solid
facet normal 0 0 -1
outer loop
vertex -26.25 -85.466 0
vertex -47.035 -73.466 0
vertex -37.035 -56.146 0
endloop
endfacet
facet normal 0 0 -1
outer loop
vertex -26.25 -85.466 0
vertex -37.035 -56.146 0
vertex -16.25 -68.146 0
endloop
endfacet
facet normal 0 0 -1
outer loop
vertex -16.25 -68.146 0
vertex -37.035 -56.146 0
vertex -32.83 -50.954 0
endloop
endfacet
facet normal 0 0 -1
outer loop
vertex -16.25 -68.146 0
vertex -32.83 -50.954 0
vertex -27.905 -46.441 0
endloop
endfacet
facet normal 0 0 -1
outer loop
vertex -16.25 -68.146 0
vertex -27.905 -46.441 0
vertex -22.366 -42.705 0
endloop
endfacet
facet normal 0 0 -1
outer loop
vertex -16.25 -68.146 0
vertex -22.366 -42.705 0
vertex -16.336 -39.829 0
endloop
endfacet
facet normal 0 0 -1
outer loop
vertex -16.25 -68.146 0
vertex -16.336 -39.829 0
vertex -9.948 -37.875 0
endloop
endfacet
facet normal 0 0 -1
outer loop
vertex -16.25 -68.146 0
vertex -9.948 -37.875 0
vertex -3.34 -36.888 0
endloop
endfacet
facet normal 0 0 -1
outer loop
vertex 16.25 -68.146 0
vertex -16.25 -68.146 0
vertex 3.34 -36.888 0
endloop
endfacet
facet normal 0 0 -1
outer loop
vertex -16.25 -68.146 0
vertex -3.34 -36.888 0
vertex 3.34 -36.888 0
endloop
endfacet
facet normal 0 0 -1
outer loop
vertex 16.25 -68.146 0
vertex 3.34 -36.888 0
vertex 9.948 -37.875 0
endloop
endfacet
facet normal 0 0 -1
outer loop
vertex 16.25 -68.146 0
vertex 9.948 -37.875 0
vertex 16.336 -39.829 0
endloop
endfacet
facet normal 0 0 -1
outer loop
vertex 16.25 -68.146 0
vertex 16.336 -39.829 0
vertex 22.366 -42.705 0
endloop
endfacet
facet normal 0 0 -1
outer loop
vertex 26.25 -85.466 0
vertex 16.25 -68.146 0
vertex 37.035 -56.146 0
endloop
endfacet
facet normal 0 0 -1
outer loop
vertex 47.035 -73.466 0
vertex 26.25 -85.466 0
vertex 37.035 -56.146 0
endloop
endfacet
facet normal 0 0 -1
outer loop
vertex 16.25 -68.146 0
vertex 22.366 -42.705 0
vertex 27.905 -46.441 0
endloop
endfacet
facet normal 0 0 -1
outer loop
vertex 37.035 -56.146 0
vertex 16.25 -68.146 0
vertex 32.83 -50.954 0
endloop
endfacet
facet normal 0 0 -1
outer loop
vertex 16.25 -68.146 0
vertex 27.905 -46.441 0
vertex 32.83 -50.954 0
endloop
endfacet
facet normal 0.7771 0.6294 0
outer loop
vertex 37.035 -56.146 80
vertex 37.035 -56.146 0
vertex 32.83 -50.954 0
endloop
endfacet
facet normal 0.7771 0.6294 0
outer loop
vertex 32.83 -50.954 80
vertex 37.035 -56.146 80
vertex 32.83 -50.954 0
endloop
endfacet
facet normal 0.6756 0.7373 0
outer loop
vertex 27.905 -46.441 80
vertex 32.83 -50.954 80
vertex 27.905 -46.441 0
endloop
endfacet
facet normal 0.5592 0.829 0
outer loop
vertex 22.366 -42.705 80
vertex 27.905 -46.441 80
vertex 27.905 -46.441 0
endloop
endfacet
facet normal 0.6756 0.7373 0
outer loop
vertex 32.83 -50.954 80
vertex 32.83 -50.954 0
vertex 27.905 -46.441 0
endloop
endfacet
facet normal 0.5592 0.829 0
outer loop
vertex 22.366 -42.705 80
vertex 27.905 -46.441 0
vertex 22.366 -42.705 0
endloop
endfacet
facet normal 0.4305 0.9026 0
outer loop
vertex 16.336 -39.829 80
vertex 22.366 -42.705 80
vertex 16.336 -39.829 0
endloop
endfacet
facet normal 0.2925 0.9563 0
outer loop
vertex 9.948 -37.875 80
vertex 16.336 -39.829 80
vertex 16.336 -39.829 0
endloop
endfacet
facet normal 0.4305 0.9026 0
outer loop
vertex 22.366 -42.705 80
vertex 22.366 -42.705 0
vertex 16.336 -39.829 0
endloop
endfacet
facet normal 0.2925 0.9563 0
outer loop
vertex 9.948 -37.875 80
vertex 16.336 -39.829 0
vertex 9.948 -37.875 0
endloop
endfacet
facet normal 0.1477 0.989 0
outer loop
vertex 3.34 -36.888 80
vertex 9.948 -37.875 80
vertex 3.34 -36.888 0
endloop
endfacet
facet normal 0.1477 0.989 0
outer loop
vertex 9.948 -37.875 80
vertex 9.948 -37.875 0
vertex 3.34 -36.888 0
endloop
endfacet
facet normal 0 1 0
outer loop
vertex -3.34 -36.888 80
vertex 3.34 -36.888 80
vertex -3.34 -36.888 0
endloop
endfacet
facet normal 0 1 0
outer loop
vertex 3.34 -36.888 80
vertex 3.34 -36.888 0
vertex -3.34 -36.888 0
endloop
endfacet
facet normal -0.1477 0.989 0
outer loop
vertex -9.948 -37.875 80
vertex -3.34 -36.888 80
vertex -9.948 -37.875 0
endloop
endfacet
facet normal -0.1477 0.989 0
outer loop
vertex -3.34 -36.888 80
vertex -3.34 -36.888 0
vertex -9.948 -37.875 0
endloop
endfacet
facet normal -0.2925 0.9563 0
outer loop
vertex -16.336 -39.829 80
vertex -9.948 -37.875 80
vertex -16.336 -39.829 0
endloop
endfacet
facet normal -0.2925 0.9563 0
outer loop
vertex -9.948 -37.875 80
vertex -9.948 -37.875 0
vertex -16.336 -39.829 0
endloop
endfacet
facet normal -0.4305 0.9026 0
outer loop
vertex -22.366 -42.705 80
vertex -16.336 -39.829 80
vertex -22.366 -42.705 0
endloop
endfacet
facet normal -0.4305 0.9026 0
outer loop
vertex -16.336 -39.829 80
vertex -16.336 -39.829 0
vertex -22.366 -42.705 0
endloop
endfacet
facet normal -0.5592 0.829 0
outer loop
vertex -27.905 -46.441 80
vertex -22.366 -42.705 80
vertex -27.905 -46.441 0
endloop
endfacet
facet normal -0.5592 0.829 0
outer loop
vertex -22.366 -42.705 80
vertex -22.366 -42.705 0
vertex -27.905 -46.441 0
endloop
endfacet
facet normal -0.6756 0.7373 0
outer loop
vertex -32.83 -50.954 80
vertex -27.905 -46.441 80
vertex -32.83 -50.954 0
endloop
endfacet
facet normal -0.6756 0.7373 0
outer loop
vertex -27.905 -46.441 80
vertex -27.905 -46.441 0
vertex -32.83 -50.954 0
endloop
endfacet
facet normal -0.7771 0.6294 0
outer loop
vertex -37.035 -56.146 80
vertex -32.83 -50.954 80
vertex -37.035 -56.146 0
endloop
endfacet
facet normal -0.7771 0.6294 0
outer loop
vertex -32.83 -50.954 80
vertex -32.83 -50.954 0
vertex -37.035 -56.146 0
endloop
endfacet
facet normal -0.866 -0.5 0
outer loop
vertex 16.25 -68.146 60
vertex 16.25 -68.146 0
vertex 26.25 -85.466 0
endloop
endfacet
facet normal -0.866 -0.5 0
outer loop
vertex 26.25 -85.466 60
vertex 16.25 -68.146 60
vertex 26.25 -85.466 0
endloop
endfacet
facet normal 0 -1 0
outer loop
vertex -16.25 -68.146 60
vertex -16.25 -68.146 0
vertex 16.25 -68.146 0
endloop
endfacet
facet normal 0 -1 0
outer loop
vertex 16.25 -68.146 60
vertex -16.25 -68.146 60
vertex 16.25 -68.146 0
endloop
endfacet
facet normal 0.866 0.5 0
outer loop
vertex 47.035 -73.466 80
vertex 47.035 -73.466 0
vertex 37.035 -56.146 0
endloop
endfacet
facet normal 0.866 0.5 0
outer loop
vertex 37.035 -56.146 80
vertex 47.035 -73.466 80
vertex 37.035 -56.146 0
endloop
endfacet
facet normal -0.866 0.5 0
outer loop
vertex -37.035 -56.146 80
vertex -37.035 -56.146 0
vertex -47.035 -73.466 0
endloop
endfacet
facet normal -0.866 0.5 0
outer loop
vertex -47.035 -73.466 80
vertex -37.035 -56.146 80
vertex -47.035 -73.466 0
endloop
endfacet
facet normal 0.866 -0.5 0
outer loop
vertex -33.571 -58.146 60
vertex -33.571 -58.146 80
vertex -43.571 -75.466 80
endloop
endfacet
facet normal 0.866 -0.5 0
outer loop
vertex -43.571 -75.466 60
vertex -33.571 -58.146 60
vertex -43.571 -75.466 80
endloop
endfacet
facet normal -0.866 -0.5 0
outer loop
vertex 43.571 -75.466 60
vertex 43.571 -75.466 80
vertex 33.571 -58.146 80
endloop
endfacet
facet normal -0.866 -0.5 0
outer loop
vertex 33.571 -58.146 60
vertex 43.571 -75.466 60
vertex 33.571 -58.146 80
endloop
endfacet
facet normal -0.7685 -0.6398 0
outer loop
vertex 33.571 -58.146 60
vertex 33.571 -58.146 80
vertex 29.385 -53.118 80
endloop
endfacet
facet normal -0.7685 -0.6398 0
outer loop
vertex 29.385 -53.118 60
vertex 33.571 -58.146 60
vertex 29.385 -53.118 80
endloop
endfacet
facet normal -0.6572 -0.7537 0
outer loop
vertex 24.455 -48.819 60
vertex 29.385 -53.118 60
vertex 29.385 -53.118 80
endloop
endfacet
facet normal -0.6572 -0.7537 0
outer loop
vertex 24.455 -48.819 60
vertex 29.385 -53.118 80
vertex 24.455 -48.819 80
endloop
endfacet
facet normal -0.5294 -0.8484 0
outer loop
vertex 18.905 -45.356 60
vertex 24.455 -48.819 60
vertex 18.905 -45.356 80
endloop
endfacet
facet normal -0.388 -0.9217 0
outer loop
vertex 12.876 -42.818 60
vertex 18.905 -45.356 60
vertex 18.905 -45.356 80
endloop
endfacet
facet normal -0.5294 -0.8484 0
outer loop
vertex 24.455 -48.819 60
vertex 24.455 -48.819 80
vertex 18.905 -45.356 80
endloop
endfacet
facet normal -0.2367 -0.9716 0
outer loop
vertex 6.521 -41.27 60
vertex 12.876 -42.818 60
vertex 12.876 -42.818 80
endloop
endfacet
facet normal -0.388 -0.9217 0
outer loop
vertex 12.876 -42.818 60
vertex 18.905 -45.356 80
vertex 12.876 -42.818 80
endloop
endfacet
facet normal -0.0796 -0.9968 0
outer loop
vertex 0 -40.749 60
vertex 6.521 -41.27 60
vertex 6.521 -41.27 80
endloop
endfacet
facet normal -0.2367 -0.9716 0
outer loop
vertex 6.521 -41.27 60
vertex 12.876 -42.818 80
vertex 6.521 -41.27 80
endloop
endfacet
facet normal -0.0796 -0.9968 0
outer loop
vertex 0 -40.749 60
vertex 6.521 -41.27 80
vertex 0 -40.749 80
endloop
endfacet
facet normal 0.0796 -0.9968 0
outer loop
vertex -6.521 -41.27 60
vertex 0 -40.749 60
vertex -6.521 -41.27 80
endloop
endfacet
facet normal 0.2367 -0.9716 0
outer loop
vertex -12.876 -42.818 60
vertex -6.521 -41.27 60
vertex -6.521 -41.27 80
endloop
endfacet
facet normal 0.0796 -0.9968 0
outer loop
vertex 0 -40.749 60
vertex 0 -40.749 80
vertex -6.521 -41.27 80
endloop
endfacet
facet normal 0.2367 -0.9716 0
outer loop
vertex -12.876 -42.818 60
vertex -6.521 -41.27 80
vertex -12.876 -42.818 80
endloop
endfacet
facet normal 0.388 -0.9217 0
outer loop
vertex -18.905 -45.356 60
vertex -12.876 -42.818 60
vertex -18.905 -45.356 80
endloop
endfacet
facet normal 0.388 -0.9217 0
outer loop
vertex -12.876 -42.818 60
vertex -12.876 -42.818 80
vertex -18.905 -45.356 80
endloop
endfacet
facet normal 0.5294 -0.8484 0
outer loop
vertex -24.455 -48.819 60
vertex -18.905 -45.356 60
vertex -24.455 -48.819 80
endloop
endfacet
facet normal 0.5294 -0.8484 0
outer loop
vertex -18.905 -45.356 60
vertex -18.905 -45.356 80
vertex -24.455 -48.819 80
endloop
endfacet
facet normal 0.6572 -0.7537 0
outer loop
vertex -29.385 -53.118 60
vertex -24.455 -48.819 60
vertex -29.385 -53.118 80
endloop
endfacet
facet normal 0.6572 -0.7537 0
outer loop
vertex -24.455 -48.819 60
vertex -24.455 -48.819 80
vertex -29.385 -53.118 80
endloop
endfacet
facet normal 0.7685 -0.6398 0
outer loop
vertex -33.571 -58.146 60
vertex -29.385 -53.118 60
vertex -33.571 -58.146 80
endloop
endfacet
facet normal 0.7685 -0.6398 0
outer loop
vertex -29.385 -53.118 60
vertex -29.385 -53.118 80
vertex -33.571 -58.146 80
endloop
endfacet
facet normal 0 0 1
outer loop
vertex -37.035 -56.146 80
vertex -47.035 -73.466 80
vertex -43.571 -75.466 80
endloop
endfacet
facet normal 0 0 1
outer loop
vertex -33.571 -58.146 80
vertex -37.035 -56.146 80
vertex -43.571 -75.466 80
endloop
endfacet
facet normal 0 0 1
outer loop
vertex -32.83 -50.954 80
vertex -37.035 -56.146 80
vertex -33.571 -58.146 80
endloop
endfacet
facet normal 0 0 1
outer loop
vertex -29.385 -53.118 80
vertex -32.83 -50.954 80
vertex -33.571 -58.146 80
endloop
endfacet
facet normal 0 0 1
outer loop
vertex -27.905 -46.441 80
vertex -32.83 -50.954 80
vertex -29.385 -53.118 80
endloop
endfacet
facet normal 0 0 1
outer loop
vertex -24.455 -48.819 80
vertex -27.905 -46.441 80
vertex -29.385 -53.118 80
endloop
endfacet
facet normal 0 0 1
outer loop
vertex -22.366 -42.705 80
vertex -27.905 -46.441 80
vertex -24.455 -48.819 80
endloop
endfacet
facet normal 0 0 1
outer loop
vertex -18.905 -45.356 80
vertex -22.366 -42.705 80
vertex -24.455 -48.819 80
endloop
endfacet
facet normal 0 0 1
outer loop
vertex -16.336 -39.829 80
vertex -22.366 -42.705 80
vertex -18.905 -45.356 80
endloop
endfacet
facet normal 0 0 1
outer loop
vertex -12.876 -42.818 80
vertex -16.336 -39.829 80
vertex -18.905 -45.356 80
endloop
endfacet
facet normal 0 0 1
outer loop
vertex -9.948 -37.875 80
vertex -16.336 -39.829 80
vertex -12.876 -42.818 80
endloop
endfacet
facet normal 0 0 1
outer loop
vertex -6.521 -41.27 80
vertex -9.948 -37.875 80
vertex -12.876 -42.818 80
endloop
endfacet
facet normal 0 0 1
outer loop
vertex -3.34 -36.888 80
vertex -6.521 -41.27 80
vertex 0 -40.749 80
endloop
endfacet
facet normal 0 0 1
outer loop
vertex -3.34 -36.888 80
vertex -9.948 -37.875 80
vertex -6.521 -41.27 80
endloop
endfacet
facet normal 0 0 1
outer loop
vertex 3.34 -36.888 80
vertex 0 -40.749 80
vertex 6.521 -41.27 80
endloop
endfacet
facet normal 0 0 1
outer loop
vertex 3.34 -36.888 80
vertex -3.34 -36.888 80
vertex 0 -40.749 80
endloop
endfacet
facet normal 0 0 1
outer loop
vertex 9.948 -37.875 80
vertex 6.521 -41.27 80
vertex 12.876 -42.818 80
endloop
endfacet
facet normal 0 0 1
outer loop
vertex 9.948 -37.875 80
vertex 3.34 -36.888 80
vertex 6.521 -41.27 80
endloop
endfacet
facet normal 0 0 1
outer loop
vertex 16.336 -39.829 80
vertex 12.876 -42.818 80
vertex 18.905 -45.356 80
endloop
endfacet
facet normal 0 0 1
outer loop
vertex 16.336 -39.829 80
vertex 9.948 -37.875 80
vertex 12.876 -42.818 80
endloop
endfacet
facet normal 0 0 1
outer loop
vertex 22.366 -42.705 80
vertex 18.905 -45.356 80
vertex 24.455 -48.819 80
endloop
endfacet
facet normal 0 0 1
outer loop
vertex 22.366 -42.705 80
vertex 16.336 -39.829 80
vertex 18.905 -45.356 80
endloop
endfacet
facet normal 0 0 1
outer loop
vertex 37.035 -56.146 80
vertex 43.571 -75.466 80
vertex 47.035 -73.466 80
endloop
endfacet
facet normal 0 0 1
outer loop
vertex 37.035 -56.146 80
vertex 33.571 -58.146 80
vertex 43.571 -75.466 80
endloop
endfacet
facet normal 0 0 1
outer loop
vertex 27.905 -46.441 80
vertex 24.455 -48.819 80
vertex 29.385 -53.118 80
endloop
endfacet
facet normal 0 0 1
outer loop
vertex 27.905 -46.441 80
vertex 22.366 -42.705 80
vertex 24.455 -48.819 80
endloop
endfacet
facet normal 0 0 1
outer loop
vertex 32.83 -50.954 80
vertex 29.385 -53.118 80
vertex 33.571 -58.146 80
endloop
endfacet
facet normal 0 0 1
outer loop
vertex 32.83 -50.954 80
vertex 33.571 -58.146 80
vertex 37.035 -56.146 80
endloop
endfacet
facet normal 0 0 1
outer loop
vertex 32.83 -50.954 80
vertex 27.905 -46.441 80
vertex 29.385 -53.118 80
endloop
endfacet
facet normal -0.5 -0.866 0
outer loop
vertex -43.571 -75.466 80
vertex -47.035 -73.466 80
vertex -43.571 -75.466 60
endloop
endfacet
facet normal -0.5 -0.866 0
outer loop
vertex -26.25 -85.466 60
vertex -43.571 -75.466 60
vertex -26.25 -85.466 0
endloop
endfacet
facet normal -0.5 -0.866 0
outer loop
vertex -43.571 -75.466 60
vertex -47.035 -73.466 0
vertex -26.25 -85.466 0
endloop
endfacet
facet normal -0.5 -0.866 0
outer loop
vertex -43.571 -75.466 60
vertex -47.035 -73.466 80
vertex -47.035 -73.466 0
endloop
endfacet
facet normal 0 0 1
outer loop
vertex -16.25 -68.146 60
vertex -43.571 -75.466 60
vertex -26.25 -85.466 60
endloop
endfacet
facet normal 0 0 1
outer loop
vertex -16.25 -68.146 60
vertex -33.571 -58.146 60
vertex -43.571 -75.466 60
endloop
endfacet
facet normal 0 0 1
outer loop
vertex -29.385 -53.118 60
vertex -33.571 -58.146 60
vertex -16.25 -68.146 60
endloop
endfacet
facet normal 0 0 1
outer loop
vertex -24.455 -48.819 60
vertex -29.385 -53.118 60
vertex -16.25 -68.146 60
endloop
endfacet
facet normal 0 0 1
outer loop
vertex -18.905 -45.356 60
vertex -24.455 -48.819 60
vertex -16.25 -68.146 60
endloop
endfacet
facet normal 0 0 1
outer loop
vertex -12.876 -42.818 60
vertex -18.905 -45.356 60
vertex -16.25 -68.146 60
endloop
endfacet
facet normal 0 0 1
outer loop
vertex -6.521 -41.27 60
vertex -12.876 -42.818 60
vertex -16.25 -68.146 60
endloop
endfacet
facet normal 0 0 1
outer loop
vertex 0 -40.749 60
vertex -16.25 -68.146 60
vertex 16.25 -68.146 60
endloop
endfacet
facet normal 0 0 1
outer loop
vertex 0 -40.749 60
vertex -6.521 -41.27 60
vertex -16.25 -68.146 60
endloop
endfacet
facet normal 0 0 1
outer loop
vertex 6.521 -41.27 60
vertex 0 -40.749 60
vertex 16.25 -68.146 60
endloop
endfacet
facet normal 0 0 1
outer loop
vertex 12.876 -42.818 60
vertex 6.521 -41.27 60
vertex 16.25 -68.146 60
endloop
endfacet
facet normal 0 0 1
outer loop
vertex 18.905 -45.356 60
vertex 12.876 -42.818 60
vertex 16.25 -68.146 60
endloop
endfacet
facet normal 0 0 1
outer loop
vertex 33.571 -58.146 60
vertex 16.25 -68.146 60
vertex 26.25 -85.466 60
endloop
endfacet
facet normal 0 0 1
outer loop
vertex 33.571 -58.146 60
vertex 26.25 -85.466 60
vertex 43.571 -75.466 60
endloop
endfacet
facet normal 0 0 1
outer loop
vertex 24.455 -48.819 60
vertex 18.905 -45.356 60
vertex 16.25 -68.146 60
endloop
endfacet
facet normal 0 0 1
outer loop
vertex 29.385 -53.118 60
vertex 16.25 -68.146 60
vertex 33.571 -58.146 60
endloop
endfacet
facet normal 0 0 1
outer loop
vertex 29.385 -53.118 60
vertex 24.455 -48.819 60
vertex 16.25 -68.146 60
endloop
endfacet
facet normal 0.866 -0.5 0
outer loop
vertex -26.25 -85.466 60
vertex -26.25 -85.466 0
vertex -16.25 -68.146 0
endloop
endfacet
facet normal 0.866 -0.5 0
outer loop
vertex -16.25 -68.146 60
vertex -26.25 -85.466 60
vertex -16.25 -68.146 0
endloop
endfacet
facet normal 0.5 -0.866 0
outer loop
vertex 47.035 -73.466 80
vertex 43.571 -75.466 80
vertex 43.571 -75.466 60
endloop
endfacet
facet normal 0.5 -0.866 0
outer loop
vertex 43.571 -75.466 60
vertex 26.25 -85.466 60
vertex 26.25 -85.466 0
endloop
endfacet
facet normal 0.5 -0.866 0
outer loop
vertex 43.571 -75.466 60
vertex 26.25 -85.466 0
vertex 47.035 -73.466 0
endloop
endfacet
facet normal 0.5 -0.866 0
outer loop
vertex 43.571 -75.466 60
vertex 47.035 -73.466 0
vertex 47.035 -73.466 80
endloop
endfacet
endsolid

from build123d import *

# Parameters (mm, degrees)
F2_DEPTH = 80
F4_DEPTH = 20


with BuildPart() as f2:
    # F1 (on Top) → F2 (new body)
    with BuildSketch(Plane.XY):
        Polygon((-47.03461, -73.466334), (-26.25, -85.466334), (-16.25, -68.145826), (-37.03461, -56.145826), align=None)
        with BuildLine():
            Line((-37.03461, -56.145826), (-16.25, -68.145826))
            Line((-16.25, -68.145826), (16.25, -68.145826))
            Line((16.25, -68.145826), (37.03461, -56.145826))
            ThreePointArc((37.03461, -56.145826), (0, -36.763884), (-37.03461, -56.145826))
        make_face()
        Polygon((37.03461, -56.145826), (16.25, -68.145826), (26.25, -85.466334), (47.03461, -73.466334), align=None)
    extrude(amount=F2_DEPTH)

    # F3 (on face) → F4 (cut)
    with BuildSketch(Plane.XY.offset(80)):
        with BuildLine():
            Line((-43.570508, -75.466334), (-26.25, -85.466334))
            Line((-26.25, -85.466334), (-16.25, -68.145826))
            Line((-16.25, -68.145826), (16.25, -68.145826))
            Line((16.25, -68.145826), (26.25, -85.466334))
            Line((26.25, -85.466334), (43.570508, -75.466334))
            Line((43.570508, -75.466334), (33.570508, -58.145826))
            ThreePointArc((33.570508, -58.145826), (0, -40.748813), (-33.570508, -58.145826))
            Line((-33.570508, -58.145826), (-43.570508, -75.466334))
        make_face()
    extrude(amount=-F4_DEPTH, mode=Mode.SUBTRACT)


solid = f2.part
